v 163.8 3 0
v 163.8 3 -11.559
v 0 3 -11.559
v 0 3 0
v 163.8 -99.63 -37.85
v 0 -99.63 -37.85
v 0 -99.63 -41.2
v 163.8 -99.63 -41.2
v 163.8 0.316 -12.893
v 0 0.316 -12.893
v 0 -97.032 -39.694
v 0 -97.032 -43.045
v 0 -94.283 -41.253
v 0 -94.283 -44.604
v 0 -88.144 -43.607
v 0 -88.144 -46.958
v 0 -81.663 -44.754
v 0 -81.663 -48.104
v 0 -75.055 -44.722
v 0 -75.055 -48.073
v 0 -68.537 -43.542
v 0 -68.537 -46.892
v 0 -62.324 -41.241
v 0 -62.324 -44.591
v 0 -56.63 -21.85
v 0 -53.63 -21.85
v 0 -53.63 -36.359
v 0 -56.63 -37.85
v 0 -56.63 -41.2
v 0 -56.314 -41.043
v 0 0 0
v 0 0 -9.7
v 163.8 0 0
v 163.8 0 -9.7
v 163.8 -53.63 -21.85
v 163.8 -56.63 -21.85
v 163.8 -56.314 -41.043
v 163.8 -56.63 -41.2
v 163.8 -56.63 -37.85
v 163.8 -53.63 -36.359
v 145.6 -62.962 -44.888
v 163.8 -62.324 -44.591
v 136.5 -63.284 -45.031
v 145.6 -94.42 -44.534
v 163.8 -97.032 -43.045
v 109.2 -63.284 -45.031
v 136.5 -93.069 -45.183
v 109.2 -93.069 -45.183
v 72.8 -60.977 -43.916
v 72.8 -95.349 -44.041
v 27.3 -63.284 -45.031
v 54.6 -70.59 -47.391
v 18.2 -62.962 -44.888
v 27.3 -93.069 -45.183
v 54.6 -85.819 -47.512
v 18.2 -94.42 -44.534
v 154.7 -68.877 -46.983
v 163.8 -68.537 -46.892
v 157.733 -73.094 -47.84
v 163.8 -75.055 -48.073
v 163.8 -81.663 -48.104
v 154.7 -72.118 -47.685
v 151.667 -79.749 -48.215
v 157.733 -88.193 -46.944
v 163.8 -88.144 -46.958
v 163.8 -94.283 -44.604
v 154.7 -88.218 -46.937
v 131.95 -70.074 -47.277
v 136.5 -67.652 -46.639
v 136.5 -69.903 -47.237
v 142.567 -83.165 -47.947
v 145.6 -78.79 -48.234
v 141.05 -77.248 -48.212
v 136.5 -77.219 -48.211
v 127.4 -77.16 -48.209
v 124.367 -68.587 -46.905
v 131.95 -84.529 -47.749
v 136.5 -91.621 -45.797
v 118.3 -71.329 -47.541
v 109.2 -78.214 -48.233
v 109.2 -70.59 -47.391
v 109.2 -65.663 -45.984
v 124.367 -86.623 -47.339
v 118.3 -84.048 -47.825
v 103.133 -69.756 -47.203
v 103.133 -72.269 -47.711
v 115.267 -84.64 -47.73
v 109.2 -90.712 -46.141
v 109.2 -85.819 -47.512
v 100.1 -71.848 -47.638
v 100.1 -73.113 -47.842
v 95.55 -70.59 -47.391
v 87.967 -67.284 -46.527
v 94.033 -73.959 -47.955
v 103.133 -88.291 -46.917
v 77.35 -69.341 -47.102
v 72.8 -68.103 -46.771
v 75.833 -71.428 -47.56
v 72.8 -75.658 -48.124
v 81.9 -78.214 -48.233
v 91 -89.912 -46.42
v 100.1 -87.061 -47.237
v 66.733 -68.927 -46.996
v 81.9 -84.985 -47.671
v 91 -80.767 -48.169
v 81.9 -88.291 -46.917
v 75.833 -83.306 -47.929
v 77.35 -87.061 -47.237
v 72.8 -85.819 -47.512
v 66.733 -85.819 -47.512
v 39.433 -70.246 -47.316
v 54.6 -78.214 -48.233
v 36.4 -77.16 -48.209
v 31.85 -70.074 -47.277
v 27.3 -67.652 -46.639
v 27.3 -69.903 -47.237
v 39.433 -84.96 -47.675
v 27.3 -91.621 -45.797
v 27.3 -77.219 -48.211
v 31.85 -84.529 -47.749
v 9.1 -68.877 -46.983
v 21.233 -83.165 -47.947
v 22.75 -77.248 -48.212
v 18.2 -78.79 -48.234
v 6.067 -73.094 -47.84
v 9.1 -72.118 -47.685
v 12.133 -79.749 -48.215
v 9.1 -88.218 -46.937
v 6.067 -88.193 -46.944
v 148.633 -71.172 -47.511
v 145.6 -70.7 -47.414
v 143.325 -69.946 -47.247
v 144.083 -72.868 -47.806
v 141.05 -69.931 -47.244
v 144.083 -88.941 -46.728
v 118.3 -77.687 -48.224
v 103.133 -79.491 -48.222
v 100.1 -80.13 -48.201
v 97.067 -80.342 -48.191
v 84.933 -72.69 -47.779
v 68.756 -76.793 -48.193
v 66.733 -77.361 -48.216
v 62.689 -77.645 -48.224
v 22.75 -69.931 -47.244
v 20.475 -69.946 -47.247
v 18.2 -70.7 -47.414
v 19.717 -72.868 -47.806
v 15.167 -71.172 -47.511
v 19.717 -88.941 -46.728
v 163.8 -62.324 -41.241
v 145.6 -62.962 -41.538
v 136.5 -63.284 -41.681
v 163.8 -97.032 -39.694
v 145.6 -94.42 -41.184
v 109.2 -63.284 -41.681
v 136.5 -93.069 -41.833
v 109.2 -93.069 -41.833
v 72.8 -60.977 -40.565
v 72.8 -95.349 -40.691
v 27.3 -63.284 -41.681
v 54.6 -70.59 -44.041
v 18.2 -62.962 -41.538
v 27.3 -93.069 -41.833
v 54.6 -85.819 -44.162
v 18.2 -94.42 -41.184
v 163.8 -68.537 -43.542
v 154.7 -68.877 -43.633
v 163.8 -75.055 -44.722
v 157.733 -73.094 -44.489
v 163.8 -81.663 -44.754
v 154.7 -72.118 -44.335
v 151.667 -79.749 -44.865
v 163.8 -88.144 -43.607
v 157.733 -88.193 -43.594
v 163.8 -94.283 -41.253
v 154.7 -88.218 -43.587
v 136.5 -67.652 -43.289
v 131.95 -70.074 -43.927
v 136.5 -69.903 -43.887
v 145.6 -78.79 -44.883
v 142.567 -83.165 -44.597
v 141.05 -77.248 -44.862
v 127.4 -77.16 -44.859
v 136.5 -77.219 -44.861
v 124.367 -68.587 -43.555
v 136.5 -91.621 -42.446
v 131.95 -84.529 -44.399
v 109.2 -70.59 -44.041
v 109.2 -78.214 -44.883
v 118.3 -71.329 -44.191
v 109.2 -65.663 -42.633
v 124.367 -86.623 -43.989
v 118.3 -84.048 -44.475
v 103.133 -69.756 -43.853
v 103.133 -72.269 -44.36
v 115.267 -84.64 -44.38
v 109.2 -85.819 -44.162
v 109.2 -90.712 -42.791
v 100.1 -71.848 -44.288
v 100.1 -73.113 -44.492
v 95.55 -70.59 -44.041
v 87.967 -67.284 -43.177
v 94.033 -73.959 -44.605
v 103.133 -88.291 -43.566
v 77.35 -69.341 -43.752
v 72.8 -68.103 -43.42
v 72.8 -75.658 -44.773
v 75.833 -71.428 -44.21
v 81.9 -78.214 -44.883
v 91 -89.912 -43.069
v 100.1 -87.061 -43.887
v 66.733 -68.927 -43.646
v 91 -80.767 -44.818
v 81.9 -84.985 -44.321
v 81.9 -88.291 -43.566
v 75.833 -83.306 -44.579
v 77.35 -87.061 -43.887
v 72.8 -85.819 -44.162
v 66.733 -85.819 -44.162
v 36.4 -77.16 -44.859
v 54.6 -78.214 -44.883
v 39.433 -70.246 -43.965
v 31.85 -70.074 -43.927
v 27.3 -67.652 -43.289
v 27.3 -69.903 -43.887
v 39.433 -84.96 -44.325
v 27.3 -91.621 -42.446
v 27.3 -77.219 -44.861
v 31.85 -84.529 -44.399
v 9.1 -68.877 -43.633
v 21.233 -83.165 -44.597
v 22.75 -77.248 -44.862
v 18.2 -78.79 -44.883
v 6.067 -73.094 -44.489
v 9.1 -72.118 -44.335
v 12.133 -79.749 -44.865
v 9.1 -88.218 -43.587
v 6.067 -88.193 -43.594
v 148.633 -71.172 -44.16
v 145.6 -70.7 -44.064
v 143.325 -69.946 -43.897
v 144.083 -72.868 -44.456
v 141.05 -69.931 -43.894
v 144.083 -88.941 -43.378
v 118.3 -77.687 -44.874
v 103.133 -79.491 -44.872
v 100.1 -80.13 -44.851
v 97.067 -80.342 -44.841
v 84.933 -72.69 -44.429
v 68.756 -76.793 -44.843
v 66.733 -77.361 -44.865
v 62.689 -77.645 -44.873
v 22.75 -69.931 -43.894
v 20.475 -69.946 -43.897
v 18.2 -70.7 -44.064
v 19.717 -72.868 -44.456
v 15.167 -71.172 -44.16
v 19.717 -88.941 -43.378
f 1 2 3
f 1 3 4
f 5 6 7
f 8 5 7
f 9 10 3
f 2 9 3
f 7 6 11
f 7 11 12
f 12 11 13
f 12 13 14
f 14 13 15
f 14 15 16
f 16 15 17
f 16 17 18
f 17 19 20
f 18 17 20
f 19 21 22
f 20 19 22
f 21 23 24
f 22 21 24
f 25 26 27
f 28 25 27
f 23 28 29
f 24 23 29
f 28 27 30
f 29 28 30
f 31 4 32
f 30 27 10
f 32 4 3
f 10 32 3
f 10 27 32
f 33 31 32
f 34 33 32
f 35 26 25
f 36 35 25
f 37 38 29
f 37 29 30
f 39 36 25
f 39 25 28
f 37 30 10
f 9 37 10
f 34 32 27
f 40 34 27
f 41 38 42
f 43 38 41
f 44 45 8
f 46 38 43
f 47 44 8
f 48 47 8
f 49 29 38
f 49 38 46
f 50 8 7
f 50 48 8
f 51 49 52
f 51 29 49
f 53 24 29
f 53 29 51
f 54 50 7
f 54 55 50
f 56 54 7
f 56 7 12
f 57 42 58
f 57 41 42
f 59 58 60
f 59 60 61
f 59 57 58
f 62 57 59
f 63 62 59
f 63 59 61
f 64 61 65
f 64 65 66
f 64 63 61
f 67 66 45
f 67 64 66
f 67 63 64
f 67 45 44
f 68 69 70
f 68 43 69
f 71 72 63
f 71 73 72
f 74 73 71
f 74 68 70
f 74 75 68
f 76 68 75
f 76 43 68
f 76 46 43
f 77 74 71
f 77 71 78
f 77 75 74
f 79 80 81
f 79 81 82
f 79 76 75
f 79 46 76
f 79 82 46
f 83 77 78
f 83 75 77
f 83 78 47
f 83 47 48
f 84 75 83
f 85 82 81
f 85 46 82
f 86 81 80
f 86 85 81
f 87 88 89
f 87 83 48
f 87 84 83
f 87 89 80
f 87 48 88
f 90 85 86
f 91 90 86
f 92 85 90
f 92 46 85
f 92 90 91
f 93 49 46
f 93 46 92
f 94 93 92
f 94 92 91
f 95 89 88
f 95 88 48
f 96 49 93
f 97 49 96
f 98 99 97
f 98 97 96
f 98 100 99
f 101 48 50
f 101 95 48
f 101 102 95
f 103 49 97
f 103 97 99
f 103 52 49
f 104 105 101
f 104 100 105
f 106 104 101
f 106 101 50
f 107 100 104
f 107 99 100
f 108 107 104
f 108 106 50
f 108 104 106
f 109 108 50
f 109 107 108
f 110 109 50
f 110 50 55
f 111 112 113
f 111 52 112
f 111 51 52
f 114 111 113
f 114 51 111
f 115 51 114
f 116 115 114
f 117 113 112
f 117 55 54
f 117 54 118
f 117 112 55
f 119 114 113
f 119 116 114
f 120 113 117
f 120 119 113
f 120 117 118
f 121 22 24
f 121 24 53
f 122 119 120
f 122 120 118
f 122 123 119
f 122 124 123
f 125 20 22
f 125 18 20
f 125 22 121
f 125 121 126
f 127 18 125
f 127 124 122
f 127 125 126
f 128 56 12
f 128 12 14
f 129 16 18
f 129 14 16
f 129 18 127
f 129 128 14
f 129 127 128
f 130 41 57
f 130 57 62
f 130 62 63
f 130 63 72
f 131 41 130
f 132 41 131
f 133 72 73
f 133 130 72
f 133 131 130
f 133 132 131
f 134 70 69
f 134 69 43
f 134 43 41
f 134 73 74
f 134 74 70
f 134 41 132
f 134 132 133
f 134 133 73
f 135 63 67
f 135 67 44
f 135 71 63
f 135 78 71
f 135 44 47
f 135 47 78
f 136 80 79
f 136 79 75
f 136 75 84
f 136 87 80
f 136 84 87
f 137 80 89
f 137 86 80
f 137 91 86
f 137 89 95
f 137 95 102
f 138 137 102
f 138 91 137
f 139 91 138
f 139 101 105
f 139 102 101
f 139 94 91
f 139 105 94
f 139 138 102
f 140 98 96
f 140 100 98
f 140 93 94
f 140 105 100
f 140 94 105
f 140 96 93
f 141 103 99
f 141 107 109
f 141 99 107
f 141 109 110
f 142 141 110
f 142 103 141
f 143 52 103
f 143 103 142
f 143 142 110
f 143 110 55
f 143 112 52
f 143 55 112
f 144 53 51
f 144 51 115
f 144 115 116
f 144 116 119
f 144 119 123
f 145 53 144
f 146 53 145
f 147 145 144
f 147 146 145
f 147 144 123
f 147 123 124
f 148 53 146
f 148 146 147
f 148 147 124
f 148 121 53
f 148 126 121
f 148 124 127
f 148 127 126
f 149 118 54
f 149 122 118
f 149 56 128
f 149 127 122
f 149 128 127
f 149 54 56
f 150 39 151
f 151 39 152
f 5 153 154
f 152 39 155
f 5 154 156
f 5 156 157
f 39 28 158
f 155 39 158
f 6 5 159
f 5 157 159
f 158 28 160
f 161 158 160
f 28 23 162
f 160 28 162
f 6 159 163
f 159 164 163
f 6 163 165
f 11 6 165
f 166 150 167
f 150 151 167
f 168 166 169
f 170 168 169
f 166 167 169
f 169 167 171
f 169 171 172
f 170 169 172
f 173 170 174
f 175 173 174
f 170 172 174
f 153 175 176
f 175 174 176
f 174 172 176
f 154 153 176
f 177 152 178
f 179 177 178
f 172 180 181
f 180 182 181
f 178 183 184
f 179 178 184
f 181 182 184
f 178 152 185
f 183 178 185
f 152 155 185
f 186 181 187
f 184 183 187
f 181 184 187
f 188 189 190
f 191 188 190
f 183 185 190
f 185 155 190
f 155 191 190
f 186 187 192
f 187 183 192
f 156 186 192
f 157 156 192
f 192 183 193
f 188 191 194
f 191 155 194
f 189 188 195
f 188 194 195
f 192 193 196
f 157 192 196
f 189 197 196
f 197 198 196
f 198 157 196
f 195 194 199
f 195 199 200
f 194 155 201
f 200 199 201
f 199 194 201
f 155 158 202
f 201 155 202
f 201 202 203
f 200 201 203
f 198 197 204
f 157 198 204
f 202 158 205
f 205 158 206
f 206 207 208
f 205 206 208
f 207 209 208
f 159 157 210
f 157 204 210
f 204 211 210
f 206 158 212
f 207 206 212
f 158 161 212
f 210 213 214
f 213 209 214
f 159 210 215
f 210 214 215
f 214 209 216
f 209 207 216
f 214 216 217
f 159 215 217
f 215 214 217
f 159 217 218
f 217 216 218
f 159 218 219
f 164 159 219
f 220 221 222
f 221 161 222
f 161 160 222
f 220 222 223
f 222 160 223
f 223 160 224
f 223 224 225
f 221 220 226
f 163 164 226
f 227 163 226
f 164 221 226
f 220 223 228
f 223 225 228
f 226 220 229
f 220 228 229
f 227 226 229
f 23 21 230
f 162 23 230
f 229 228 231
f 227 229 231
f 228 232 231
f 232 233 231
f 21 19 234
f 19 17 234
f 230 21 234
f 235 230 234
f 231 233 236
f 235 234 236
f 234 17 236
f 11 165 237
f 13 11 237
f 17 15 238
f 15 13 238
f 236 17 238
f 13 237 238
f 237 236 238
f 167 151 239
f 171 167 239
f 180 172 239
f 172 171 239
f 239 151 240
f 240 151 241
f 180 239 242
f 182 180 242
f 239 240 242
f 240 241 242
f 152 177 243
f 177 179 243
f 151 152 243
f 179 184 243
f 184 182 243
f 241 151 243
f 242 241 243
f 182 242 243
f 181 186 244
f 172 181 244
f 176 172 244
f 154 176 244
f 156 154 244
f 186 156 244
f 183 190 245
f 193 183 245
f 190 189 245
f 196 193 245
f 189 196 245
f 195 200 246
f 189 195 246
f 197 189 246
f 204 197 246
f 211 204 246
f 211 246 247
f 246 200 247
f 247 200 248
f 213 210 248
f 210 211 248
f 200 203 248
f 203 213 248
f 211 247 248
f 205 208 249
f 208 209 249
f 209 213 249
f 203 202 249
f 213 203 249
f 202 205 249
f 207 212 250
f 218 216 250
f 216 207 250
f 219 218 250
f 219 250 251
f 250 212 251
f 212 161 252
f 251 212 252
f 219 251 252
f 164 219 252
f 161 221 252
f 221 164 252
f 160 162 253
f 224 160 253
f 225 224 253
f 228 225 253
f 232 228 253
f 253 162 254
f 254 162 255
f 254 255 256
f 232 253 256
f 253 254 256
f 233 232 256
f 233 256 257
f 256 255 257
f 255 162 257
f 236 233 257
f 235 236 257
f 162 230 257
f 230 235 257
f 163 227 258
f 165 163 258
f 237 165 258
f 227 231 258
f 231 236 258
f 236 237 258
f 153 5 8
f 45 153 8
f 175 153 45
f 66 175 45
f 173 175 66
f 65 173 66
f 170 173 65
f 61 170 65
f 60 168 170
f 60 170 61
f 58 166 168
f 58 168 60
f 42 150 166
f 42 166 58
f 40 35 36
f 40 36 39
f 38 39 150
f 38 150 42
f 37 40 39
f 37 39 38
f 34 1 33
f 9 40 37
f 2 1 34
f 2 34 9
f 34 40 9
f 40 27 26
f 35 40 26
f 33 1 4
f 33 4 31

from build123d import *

# Parameters (mm, degrees)
EXTRUDE_1_DEPTH = 163.8


with BuildPart() as part:
    # 草图1 → 凸台-拉伸1 (new body)
    with BuildSketch(Plane(origin=(0, 0, 0), x_dir=(0, 0, -1), z_dir=(1, 0, 0))):
        with BuildLine():
            Line((9.7, 0), (36.35874095, -53.63))
            Line((36.35874095, -53.63), (21.85, -53.63))
            Line((21.85, -53.63), (21.85, -56.63))
            Line((21.85, -56.63), (37.85, -56.63))
            add(Edge.make_bspline(
                [(37.85, -56.63), (46.953982553, -69.060712167), (47.499791502, -87.422152902), (37.85, -99.63)],
                knots=[0, 0, 0, 0, 1, 1, 1, 1], degree=3))
            Line((37.85, -99.63), (41.200202017, -99.63))
            add(Edge.make_bspline(
                [(41.200202017, -56.63), (50.30418457, -69.060712167), (50.849993519, -87.422152902), (41.200202017, -99.63)],
                knots=[0, 0, 0, 0, 1, 1, 1, 1], degree=3))
            Line((41.200202017, -56.63), (41.042940367, -56.313633136))
            Line((41.042940367, -56.313633136), (12.892940367, 0.316366864))
            Line((12.892940367, 0.316366864), (11.558942967, 3))
            Line((11.558942967, 3), (0, 3))
            Line((0, 3), (0, 0))
            Line((0, 0), (9.7, 0))
        make_face()
    extrude(amount=EXTRUDE_1_DEPTH)


solid = part.part
